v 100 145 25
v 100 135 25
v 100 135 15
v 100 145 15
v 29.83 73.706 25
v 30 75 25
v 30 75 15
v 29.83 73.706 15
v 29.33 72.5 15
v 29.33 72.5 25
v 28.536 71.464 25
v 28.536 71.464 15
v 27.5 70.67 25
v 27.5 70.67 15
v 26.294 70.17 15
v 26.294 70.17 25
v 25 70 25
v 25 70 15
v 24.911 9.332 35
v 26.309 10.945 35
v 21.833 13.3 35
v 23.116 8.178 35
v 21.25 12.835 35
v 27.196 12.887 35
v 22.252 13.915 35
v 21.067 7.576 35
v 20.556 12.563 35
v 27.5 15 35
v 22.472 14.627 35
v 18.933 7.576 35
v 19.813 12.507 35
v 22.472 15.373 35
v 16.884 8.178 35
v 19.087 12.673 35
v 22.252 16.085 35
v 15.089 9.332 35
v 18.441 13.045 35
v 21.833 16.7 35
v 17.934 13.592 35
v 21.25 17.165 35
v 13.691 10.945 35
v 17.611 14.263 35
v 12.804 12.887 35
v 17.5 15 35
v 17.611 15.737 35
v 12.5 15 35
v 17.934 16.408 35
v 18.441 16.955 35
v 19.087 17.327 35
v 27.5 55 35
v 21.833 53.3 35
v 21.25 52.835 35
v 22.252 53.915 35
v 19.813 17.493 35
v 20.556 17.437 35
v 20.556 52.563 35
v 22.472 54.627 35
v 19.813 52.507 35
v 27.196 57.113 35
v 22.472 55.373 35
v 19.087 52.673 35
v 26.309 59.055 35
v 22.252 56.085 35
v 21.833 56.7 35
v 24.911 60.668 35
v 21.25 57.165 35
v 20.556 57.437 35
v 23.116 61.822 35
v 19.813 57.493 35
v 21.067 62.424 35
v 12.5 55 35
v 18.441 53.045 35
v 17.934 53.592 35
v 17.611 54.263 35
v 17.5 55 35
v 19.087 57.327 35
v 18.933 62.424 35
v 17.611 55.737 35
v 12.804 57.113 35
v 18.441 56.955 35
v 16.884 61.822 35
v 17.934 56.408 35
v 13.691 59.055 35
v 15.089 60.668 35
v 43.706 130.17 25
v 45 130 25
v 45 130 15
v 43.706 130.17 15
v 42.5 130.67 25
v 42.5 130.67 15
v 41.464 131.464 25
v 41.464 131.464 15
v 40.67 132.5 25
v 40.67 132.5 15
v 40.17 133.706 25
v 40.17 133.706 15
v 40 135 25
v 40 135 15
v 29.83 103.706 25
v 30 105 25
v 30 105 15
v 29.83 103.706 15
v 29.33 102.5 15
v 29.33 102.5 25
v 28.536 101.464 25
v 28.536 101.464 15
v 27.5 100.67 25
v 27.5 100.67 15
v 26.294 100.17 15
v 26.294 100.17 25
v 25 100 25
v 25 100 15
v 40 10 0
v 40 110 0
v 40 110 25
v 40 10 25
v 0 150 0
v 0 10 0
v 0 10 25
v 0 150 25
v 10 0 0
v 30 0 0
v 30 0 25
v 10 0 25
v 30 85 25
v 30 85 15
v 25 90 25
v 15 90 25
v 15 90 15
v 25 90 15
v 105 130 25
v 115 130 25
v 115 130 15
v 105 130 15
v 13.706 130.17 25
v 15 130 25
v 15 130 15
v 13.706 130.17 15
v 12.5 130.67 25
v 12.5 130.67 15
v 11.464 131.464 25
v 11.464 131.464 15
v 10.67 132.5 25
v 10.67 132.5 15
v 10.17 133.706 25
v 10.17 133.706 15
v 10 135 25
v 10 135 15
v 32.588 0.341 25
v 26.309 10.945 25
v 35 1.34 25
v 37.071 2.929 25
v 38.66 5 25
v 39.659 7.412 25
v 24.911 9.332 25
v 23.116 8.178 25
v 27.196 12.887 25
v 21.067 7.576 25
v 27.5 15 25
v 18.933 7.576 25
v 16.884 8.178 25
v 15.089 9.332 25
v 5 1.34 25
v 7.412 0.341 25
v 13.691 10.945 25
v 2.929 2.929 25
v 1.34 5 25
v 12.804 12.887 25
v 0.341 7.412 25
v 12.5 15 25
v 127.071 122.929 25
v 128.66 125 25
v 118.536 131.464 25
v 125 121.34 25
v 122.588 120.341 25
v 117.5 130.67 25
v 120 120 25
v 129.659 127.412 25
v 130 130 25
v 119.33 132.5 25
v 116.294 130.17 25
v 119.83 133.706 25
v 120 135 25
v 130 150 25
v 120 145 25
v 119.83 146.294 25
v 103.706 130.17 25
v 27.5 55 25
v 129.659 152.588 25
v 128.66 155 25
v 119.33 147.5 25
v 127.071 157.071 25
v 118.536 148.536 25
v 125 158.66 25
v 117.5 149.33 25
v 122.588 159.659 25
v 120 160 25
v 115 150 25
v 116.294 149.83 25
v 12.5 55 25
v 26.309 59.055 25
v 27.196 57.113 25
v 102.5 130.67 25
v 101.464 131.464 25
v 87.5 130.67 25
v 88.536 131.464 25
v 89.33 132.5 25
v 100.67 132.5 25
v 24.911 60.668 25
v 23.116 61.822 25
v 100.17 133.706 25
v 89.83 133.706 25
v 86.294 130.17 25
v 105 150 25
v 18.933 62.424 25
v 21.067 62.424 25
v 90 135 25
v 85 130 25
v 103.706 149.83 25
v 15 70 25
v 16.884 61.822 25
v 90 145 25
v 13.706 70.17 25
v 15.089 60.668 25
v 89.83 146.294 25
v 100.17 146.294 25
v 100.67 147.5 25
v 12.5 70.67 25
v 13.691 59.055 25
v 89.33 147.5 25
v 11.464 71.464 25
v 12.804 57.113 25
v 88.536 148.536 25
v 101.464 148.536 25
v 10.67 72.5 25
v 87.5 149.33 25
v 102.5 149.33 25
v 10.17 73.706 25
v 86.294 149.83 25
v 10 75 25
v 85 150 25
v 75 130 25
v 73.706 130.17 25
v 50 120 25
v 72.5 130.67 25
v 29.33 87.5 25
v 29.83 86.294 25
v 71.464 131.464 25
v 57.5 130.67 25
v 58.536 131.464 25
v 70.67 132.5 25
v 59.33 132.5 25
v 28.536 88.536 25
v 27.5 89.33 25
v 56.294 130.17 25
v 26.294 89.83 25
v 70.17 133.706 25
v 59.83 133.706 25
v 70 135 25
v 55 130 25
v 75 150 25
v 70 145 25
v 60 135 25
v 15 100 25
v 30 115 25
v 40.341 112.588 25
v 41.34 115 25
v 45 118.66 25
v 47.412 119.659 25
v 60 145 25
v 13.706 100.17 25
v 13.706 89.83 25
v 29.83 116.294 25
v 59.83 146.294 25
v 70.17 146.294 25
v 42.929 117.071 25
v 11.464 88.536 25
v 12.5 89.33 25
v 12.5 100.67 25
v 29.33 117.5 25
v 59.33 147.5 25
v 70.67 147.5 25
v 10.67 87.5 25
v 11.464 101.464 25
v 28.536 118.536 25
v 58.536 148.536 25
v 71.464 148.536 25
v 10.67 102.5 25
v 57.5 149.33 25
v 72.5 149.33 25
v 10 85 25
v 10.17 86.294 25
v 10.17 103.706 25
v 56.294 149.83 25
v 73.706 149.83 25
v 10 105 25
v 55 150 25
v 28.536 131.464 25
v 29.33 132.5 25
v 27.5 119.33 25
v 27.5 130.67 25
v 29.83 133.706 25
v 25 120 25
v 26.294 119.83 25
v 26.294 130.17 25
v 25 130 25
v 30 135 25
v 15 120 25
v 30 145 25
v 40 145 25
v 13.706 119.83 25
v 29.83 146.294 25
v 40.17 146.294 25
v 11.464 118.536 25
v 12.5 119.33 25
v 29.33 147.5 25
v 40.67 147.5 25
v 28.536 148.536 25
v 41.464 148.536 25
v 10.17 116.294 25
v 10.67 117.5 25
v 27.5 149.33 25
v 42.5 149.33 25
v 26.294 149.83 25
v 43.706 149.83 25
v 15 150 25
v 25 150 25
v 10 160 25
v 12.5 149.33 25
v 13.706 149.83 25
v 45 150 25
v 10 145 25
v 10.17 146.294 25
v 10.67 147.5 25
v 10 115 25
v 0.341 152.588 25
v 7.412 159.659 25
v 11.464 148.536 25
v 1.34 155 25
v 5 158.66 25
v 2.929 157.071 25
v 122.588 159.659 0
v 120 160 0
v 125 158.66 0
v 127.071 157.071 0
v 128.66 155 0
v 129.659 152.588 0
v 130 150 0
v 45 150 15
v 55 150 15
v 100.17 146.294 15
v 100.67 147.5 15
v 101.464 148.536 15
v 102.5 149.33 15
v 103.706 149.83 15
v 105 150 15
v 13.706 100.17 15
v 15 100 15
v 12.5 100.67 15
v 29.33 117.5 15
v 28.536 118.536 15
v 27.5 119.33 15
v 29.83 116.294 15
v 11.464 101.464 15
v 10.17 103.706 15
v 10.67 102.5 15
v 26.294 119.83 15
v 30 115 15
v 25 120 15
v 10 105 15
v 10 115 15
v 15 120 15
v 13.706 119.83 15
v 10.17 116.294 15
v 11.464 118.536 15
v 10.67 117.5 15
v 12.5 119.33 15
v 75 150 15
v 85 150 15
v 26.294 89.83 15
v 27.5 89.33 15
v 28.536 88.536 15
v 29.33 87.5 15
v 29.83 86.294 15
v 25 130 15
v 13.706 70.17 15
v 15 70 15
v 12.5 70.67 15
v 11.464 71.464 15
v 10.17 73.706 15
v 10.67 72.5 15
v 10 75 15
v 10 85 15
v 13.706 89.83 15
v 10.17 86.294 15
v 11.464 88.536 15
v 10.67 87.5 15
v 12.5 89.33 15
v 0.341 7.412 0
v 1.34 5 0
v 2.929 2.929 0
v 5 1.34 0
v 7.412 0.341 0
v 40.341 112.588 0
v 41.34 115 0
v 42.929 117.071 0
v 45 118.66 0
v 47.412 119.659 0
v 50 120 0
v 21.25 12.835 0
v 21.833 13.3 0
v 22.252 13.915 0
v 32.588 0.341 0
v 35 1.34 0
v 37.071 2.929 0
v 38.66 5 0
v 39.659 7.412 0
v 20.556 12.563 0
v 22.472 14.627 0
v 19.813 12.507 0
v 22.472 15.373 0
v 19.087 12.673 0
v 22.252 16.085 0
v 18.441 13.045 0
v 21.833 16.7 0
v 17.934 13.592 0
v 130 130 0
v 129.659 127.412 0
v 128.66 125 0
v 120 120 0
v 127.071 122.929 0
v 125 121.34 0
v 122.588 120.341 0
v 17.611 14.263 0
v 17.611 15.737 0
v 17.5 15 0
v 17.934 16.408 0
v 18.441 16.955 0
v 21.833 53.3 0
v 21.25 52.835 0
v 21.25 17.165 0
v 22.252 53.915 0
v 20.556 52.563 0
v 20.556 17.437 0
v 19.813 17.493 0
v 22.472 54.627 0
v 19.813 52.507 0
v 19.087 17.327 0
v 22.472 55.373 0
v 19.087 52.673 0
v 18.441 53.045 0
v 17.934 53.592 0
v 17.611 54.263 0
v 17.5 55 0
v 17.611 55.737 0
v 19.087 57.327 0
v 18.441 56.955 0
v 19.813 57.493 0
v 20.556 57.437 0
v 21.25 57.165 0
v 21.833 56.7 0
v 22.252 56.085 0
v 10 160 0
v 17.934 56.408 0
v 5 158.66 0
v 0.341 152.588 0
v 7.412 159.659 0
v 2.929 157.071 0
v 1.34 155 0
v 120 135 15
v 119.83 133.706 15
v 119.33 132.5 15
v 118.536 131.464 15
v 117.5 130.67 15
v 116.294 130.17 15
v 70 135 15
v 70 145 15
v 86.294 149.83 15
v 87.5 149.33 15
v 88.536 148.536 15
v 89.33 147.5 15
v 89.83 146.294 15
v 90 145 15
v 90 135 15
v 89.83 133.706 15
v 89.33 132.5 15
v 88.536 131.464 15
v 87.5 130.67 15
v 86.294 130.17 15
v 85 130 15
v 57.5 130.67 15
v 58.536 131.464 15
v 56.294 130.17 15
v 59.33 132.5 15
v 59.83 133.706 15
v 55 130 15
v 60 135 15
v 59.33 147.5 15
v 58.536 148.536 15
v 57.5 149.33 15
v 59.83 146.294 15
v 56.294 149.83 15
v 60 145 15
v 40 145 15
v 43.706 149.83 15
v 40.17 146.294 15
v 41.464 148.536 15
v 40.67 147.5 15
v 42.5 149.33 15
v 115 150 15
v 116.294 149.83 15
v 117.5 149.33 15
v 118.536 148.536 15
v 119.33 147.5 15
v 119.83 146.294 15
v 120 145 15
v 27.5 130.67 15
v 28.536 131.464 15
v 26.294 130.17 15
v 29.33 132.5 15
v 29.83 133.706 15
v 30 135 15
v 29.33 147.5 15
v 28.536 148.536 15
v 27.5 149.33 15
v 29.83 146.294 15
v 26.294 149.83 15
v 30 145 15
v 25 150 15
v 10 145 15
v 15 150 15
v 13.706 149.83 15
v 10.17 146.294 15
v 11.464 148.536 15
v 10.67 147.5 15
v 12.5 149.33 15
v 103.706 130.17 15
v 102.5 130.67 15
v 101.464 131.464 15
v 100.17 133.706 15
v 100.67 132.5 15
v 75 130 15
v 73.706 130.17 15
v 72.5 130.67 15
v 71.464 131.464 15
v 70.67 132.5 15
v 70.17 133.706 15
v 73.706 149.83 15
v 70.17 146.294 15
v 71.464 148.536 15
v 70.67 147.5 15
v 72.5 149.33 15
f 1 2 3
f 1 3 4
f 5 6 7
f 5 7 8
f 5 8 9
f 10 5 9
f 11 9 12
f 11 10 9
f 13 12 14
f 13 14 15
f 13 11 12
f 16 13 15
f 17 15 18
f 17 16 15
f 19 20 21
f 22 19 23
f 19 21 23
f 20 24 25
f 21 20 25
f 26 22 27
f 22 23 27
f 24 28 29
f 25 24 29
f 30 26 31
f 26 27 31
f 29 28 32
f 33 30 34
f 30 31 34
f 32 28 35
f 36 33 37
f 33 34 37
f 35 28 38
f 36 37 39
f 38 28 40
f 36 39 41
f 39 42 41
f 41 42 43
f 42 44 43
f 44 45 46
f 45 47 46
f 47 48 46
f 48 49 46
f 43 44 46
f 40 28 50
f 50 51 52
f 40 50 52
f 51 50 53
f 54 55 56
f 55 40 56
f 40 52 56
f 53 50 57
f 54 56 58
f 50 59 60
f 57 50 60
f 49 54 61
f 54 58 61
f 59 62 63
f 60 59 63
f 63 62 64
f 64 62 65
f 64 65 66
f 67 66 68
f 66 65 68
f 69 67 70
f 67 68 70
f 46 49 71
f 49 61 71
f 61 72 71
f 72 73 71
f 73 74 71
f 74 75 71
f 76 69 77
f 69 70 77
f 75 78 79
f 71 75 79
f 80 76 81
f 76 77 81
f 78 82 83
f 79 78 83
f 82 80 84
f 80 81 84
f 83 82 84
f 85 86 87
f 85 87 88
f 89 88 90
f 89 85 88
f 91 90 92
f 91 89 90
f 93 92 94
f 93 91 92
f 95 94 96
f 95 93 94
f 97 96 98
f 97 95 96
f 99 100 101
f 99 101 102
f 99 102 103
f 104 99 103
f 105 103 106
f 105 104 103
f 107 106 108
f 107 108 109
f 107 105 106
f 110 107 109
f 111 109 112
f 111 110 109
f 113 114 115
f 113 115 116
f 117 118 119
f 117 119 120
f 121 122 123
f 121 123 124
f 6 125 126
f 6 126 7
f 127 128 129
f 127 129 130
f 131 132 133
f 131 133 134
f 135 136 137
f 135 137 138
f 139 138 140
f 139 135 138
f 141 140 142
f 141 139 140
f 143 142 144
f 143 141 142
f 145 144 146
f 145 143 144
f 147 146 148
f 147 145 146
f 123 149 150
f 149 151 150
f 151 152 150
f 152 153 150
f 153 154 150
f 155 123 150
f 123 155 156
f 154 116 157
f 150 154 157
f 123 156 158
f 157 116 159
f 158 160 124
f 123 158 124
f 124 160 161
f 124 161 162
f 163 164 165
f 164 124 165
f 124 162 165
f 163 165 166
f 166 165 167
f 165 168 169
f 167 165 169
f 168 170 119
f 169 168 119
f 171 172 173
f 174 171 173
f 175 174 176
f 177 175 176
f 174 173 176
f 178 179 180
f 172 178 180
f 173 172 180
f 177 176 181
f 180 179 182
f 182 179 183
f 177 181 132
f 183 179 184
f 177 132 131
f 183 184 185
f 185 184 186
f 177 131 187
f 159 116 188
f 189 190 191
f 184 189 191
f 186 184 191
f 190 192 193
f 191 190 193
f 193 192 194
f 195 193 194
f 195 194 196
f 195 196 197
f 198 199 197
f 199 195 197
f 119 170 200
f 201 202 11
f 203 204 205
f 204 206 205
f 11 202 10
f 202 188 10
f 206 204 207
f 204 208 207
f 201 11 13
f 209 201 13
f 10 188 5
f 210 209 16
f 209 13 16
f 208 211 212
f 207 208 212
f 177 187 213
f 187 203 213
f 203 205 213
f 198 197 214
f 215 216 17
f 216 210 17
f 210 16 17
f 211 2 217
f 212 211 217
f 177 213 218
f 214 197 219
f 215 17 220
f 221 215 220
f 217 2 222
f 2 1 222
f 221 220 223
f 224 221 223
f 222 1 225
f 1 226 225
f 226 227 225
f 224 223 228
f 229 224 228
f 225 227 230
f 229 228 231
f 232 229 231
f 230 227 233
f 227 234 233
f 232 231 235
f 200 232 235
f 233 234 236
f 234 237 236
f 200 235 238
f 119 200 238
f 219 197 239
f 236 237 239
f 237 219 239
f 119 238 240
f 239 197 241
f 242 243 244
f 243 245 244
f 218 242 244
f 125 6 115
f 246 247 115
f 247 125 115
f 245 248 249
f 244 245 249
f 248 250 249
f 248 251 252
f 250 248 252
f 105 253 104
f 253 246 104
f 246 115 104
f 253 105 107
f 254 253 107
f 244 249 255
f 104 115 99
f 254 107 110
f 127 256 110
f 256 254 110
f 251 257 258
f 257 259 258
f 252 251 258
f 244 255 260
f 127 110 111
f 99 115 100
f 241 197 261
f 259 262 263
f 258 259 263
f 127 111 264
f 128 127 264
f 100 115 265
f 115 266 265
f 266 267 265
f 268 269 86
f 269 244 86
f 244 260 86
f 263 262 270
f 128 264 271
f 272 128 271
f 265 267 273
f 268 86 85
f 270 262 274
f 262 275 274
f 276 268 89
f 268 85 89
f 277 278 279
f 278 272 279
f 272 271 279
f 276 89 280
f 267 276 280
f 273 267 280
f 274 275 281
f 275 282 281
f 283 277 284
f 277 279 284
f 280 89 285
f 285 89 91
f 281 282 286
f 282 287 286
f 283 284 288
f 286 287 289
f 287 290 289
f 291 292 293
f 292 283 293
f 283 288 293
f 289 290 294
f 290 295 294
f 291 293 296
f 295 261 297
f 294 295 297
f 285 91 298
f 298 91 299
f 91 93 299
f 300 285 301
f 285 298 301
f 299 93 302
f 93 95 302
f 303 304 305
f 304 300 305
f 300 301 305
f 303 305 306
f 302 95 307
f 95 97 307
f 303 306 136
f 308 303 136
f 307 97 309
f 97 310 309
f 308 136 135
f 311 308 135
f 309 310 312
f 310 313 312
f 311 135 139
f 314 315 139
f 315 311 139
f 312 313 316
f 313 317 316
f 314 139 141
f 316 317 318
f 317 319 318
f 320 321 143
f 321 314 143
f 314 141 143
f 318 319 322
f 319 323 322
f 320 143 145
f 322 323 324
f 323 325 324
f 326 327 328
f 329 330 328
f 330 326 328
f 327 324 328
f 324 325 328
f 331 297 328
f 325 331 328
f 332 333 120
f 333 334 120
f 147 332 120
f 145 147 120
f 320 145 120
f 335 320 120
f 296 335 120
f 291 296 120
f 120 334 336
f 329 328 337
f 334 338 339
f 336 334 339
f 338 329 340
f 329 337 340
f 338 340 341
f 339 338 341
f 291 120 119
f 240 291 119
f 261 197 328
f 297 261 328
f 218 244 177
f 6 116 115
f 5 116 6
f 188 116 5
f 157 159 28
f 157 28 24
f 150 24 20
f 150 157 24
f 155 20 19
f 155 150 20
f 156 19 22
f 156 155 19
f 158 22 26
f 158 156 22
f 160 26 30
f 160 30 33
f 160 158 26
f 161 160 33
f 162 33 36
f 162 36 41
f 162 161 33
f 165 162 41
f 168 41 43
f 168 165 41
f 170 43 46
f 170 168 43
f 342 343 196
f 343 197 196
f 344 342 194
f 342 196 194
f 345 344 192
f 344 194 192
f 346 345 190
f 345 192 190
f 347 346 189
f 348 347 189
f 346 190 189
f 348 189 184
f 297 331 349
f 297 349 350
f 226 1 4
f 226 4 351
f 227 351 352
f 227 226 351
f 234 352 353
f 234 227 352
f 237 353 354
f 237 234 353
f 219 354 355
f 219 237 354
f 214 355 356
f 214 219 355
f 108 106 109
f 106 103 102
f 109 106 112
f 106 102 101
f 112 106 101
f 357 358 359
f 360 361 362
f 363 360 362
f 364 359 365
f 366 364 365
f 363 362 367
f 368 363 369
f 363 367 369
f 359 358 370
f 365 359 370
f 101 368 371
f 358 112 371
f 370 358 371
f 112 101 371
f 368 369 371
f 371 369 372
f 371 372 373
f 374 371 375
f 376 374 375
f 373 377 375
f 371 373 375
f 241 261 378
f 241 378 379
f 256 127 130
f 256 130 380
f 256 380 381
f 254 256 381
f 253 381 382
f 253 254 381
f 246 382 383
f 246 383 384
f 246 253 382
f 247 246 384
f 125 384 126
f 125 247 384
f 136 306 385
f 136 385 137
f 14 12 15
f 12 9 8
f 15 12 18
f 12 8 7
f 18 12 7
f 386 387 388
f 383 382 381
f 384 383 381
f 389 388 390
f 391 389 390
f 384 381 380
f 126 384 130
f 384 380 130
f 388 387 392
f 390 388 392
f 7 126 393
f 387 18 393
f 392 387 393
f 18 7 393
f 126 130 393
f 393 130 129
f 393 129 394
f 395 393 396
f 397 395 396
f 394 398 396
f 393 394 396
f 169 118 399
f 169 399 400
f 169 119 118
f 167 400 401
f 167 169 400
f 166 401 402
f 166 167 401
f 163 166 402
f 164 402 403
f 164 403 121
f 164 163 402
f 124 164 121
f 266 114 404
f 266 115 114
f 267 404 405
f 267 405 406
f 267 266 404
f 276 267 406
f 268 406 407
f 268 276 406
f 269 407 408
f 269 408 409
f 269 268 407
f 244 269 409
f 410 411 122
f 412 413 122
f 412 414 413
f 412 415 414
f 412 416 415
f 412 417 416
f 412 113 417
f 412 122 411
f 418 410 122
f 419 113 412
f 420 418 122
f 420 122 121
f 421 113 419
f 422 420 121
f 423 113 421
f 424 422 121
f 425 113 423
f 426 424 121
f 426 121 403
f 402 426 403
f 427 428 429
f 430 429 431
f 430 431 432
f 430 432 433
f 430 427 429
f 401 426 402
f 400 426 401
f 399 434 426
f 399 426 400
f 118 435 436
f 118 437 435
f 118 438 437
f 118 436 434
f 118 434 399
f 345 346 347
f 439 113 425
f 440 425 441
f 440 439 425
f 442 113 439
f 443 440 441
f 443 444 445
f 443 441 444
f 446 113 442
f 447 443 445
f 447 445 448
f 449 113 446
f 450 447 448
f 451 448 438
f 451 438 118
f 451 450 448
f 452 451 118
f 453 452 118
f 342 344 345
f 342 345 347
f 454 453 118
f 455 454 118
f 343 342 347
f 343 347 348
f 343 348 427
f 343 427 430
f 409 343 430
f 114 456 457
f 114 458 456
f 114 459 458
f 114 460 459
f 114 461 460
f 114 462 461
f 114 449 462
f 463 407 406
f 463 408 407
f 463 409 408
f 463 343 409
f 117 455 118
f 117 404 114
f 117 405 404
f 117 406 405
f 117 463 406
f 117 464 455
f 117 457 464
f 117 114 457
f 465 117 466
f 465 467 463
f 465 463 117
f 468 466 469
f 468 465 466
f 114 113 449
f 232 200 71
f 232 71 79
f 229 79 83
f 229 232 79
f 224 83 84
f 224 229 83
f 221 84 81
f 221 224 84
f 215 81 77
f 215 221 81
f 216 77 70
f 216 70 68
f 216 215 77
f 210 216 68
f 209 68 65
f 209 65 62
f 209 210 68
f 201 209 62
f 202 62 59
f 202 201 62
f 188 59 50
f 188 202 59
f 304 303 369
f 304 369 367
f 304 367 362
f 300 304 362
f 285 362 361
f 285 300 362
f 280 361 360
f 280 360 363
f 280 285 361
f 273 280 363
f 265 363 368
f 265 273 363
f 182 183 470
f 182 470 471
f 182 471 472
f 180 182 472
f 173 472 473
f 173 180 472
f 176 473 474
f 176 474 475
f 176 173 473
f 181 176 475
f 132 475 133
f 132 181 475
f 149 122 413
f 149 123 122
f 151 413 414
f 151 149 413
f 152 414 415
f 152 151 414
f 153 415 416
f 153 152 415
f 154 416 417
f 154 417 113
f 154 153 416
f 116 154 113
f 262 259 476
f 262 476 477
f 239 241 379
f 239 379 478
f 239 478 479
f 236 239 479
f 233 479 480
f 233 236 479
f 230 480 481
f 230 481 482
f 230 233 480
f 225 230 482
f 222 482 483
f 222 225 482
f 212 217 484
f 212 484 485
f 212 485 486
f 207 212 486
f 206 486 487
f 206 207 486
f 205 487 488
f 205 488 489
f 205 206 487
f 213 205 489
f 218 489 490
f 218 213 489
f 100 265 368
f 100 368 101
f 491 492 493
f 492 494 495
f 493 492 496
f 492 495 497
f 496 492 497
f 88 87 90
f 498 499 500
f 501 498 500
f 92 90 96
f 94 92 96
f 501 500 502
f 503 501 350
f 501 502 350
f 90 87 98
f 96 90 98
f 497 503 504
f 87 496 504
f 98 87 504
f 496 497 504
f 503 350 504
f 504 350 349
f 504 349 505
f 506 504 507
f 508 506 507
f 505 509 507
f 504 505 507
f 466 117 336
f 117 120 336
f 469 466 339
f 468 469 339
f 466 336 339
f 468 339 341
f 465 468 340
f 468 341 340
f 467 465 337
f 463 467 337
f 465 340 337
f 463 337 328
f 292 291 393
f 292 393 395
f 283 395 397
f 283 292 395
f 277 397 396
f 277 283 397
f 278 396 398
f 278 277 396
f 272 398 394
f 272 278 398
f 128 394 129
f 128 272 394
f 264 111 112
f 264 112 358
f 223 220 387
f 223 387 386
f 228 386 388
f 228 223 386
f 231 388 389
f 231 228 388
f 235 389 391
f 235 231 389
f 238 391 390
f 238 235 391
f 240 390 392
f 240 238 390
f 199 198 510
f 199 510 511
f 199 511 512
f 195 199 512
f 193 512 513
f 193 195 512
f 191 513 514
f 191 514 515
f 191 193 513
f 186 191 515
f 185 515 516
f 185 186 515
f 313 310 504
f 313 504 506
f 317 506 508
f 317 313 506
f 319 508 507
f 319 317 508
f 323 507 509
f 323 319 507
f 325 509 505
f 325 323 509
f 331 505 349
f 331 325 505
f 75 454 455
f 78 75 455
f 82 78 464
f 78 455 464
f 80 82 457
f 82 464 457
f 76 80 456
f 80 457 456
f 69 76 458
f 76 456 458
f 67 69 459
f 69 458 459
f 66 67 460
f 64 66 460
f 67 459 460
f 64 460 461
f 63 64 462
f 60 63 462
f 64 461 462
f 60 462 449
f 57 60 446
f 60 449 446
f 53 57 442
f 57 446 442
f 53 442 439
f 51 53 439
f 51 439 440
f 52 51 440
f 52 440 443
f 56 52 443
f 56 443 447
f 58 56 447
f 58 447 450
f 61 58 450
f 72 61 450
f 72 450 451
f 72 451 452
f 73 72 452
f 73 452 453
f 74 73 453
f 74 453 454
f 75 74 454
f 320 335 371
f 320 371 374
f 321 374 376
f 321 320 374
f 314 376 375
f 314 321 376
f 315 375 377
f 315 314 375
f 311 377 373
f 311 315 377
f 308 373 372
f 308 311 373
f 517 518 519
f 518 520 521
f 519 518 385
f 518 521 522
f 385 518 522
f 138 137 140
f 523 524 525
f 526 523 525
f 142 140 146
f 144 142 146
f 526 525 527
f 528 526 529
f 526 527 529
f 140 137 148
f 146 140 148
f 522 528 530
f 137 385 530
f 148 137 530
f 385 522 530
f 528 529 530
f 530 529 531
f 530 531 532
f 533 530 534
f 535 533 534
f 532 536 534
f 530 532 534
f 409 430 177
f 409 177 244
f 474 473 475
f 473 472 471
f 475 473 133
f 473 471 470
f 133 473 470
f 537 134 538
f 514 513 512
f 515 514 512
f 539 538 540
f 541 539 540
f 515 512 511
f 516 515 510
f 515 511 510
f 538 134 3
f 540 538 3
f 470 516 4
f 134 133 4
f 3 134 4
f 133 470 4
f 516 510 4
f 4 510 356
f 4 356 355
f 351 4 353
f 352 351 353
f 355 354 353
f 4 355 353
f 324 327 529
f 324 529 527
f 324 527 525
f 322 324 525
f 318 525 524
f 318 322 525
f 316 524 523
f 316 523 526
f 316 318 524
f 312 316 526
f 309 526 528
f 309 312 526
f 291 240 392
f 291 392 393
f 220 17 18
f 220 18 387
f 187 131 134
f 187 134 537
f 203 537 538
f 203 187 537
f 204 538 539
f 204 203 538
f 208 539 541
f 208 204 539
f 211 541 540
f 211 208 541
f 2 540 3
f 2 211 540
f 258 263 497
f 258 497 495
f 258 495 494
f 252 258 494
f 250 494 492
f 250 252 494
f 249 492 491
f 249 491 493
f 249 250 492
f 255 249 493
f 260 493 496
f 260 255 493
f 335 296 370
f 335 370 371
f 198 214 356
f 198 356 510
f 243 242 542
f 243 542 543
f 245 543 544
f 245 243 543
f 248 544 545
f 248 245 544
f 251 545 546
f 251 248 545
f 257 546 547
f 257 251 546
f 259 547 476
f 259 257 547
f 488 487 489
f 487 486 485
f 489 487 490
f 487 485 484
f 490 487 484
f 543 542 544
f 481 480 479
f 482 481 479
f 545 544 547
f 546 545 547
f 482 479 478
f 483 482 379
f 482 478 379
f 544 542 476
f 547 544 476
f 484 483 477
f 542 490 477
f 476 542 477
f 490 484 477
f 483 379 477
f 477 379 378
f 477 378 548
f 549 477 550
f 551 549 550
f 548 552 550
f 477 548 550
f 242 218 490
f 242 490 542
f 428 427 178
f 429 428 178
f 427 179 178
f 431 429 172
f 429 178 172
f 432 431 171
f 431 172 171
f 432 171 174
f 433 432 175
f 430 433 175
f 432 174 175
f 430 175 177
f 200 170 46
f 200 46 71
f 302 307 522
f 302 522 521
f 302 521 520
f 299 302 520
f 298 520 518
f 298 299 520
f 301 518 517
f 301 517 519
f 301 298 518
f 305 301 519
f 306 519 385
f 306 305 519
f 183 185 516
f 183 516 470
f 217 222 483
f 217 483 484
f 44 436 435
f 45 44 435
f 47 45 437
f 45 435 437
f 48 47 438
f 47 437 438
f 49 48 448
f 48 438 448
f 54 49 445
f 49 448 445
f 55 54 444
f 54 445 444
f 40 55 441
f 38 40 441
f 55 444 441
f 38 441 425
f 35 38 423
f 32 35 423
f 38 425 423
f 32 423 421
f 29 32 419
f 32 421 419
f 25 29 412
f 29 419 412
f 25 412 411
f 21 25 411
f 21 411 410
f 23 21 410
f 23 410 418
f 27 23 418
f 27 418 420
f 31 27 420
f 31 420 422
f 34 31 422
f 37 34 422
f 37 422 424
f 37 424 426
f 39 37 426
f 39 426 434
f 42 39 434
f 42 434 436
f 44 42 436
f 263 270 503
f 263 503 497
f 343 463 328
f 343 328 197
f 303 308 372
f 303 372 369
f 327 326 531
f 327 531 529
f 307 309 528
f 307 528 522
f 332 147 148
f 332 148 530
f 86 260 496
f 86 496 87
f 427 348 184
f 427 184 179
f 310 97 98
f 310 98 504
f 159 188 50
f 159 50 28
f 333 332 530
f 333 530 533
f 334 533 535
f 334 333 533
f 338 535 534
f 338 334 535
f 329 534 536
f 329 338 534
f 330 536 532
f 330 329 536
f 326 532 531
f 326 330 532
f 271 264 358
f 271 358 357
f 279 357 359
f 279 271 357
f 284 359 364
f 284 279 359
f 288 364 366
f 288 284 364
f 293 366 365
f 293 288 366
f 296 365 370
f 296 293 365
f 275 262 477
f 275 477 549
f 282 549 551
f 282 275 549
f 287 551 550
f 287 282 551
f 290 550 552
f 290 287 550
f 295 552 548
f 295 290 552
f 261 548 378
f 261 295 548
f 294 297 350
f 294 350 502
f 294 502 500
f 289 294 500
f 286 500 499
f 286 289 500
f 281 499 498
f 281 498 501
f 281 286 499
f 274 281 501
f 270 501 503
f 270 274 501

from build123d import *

# Parameters (mm, degrees)
BASE_EXTRUDE_DEPTH       = 25
SQUARE_CUT_DEPTH         = 10
HORIZONTAL_PATTERN_COUNT = 4
HORIZONTAL_PATTERN_PITCH = 30
VERTICAL_PATTERN_COUNT   = 3
VERTICAL_PATTERN_PITCH   = 30
SLOT_EXTRUDE_DEPTH       = 10
M6X1_0_SLOT_HOLES_D      = 5
EDGE_FILLETS_R           = 10


with BuildPart() as part:
    # Base Sketch → Base Extrude (new body)
    with BuildSketch(Plane.XY):
        Polygon((0, 0), (0, 160), (130, 160), (130, 120), (40, 120), (40, 0), align=None)
    extrude(amount=BASE_EXTRUDE_DEPTH)

    # Square Sketch → Square Cut (cut)
    with BuildSketch(Plane.XY.offset(25)):
        with BuildLine():
            Line((15, 150), (25, 150))
            ThreePointArc((25, 150), (28.535533906, 148.535533906), (30, 145))
            Line((30, 145), (30, 135))
            ThreePointArc((30, 135), (28.535533906, 131.464466094), (25, 130))
            Line((25, 130), (15, 130))
            ThreePointArc((15, 130), (11.464466094, 131.464466094), (10, 135))
            Line((10, 135), (10, 145))
            ThreePointArc((10, 145), (11.464466094, 148.535533906), (15, 150))
        make_face()
    square_cut = extrude(amount=-SQUARE_CUT_DEPTH, mode=Mode.SUBTRACT)

    # Horizontal Pattern: Square Cut ×4
    with Locations(*[(i * HORIZONTAL_PATTERN_PITCH, 0, 0) for i in range(1, HORIZONTAL_PATTERN_COUNT)]):
        add(square_cut, mode=Mode.SUBTRACT)

    # Vertical Pattern: Square Cut ×3
    with Locations(*[(0, -i * VERTICAL_PATTERN_PITCH, 0) for i in range(1, VERTICAL_PATTERN_COUNT)]):
        add(square_cut, mode=Mode.SUBTRACT)

    # Slot Sketch → Slot Extrude (add)
    with BuildSketch(Plane.XY.offset(25)):
        with BuildLine():
            Line((12.5, 15), (12.5, 55))
            ThreePointArc((12.5, 55), (20, 62.5), (27.5, 55))
            Line((27.5, 55), (27.5, 15))
            ThreePointArc((27.5, 15), (20, 7.5), (12.5, 15))
        make_face()
    extrude(amount=SLOT_EXTRUDE_DEPTH)

    # M6x1.0 Slot Holes (through all)
    with Locations(Plane.XY.offset(35)):
        with Locations((20, 55), (20, 15)):
            Hole(M6X1_0_SLOT_HOLES_D / 2)

    # Edge Fillets
    edge_fillets_edges = [part.edges().sort_by_distance(p)[0] for p in [
        (0, 0, 12.5),
        (0, 160, 12.5),
        (130, 160, 12.5),
        (130, 120, 12.5),
        (40, 120, 12.5),
        (40, 0, 12.5),
    ]]
    fillet(edge_fillets_edges, radius=EDGE_FILLETS_R)


solid = part.part
